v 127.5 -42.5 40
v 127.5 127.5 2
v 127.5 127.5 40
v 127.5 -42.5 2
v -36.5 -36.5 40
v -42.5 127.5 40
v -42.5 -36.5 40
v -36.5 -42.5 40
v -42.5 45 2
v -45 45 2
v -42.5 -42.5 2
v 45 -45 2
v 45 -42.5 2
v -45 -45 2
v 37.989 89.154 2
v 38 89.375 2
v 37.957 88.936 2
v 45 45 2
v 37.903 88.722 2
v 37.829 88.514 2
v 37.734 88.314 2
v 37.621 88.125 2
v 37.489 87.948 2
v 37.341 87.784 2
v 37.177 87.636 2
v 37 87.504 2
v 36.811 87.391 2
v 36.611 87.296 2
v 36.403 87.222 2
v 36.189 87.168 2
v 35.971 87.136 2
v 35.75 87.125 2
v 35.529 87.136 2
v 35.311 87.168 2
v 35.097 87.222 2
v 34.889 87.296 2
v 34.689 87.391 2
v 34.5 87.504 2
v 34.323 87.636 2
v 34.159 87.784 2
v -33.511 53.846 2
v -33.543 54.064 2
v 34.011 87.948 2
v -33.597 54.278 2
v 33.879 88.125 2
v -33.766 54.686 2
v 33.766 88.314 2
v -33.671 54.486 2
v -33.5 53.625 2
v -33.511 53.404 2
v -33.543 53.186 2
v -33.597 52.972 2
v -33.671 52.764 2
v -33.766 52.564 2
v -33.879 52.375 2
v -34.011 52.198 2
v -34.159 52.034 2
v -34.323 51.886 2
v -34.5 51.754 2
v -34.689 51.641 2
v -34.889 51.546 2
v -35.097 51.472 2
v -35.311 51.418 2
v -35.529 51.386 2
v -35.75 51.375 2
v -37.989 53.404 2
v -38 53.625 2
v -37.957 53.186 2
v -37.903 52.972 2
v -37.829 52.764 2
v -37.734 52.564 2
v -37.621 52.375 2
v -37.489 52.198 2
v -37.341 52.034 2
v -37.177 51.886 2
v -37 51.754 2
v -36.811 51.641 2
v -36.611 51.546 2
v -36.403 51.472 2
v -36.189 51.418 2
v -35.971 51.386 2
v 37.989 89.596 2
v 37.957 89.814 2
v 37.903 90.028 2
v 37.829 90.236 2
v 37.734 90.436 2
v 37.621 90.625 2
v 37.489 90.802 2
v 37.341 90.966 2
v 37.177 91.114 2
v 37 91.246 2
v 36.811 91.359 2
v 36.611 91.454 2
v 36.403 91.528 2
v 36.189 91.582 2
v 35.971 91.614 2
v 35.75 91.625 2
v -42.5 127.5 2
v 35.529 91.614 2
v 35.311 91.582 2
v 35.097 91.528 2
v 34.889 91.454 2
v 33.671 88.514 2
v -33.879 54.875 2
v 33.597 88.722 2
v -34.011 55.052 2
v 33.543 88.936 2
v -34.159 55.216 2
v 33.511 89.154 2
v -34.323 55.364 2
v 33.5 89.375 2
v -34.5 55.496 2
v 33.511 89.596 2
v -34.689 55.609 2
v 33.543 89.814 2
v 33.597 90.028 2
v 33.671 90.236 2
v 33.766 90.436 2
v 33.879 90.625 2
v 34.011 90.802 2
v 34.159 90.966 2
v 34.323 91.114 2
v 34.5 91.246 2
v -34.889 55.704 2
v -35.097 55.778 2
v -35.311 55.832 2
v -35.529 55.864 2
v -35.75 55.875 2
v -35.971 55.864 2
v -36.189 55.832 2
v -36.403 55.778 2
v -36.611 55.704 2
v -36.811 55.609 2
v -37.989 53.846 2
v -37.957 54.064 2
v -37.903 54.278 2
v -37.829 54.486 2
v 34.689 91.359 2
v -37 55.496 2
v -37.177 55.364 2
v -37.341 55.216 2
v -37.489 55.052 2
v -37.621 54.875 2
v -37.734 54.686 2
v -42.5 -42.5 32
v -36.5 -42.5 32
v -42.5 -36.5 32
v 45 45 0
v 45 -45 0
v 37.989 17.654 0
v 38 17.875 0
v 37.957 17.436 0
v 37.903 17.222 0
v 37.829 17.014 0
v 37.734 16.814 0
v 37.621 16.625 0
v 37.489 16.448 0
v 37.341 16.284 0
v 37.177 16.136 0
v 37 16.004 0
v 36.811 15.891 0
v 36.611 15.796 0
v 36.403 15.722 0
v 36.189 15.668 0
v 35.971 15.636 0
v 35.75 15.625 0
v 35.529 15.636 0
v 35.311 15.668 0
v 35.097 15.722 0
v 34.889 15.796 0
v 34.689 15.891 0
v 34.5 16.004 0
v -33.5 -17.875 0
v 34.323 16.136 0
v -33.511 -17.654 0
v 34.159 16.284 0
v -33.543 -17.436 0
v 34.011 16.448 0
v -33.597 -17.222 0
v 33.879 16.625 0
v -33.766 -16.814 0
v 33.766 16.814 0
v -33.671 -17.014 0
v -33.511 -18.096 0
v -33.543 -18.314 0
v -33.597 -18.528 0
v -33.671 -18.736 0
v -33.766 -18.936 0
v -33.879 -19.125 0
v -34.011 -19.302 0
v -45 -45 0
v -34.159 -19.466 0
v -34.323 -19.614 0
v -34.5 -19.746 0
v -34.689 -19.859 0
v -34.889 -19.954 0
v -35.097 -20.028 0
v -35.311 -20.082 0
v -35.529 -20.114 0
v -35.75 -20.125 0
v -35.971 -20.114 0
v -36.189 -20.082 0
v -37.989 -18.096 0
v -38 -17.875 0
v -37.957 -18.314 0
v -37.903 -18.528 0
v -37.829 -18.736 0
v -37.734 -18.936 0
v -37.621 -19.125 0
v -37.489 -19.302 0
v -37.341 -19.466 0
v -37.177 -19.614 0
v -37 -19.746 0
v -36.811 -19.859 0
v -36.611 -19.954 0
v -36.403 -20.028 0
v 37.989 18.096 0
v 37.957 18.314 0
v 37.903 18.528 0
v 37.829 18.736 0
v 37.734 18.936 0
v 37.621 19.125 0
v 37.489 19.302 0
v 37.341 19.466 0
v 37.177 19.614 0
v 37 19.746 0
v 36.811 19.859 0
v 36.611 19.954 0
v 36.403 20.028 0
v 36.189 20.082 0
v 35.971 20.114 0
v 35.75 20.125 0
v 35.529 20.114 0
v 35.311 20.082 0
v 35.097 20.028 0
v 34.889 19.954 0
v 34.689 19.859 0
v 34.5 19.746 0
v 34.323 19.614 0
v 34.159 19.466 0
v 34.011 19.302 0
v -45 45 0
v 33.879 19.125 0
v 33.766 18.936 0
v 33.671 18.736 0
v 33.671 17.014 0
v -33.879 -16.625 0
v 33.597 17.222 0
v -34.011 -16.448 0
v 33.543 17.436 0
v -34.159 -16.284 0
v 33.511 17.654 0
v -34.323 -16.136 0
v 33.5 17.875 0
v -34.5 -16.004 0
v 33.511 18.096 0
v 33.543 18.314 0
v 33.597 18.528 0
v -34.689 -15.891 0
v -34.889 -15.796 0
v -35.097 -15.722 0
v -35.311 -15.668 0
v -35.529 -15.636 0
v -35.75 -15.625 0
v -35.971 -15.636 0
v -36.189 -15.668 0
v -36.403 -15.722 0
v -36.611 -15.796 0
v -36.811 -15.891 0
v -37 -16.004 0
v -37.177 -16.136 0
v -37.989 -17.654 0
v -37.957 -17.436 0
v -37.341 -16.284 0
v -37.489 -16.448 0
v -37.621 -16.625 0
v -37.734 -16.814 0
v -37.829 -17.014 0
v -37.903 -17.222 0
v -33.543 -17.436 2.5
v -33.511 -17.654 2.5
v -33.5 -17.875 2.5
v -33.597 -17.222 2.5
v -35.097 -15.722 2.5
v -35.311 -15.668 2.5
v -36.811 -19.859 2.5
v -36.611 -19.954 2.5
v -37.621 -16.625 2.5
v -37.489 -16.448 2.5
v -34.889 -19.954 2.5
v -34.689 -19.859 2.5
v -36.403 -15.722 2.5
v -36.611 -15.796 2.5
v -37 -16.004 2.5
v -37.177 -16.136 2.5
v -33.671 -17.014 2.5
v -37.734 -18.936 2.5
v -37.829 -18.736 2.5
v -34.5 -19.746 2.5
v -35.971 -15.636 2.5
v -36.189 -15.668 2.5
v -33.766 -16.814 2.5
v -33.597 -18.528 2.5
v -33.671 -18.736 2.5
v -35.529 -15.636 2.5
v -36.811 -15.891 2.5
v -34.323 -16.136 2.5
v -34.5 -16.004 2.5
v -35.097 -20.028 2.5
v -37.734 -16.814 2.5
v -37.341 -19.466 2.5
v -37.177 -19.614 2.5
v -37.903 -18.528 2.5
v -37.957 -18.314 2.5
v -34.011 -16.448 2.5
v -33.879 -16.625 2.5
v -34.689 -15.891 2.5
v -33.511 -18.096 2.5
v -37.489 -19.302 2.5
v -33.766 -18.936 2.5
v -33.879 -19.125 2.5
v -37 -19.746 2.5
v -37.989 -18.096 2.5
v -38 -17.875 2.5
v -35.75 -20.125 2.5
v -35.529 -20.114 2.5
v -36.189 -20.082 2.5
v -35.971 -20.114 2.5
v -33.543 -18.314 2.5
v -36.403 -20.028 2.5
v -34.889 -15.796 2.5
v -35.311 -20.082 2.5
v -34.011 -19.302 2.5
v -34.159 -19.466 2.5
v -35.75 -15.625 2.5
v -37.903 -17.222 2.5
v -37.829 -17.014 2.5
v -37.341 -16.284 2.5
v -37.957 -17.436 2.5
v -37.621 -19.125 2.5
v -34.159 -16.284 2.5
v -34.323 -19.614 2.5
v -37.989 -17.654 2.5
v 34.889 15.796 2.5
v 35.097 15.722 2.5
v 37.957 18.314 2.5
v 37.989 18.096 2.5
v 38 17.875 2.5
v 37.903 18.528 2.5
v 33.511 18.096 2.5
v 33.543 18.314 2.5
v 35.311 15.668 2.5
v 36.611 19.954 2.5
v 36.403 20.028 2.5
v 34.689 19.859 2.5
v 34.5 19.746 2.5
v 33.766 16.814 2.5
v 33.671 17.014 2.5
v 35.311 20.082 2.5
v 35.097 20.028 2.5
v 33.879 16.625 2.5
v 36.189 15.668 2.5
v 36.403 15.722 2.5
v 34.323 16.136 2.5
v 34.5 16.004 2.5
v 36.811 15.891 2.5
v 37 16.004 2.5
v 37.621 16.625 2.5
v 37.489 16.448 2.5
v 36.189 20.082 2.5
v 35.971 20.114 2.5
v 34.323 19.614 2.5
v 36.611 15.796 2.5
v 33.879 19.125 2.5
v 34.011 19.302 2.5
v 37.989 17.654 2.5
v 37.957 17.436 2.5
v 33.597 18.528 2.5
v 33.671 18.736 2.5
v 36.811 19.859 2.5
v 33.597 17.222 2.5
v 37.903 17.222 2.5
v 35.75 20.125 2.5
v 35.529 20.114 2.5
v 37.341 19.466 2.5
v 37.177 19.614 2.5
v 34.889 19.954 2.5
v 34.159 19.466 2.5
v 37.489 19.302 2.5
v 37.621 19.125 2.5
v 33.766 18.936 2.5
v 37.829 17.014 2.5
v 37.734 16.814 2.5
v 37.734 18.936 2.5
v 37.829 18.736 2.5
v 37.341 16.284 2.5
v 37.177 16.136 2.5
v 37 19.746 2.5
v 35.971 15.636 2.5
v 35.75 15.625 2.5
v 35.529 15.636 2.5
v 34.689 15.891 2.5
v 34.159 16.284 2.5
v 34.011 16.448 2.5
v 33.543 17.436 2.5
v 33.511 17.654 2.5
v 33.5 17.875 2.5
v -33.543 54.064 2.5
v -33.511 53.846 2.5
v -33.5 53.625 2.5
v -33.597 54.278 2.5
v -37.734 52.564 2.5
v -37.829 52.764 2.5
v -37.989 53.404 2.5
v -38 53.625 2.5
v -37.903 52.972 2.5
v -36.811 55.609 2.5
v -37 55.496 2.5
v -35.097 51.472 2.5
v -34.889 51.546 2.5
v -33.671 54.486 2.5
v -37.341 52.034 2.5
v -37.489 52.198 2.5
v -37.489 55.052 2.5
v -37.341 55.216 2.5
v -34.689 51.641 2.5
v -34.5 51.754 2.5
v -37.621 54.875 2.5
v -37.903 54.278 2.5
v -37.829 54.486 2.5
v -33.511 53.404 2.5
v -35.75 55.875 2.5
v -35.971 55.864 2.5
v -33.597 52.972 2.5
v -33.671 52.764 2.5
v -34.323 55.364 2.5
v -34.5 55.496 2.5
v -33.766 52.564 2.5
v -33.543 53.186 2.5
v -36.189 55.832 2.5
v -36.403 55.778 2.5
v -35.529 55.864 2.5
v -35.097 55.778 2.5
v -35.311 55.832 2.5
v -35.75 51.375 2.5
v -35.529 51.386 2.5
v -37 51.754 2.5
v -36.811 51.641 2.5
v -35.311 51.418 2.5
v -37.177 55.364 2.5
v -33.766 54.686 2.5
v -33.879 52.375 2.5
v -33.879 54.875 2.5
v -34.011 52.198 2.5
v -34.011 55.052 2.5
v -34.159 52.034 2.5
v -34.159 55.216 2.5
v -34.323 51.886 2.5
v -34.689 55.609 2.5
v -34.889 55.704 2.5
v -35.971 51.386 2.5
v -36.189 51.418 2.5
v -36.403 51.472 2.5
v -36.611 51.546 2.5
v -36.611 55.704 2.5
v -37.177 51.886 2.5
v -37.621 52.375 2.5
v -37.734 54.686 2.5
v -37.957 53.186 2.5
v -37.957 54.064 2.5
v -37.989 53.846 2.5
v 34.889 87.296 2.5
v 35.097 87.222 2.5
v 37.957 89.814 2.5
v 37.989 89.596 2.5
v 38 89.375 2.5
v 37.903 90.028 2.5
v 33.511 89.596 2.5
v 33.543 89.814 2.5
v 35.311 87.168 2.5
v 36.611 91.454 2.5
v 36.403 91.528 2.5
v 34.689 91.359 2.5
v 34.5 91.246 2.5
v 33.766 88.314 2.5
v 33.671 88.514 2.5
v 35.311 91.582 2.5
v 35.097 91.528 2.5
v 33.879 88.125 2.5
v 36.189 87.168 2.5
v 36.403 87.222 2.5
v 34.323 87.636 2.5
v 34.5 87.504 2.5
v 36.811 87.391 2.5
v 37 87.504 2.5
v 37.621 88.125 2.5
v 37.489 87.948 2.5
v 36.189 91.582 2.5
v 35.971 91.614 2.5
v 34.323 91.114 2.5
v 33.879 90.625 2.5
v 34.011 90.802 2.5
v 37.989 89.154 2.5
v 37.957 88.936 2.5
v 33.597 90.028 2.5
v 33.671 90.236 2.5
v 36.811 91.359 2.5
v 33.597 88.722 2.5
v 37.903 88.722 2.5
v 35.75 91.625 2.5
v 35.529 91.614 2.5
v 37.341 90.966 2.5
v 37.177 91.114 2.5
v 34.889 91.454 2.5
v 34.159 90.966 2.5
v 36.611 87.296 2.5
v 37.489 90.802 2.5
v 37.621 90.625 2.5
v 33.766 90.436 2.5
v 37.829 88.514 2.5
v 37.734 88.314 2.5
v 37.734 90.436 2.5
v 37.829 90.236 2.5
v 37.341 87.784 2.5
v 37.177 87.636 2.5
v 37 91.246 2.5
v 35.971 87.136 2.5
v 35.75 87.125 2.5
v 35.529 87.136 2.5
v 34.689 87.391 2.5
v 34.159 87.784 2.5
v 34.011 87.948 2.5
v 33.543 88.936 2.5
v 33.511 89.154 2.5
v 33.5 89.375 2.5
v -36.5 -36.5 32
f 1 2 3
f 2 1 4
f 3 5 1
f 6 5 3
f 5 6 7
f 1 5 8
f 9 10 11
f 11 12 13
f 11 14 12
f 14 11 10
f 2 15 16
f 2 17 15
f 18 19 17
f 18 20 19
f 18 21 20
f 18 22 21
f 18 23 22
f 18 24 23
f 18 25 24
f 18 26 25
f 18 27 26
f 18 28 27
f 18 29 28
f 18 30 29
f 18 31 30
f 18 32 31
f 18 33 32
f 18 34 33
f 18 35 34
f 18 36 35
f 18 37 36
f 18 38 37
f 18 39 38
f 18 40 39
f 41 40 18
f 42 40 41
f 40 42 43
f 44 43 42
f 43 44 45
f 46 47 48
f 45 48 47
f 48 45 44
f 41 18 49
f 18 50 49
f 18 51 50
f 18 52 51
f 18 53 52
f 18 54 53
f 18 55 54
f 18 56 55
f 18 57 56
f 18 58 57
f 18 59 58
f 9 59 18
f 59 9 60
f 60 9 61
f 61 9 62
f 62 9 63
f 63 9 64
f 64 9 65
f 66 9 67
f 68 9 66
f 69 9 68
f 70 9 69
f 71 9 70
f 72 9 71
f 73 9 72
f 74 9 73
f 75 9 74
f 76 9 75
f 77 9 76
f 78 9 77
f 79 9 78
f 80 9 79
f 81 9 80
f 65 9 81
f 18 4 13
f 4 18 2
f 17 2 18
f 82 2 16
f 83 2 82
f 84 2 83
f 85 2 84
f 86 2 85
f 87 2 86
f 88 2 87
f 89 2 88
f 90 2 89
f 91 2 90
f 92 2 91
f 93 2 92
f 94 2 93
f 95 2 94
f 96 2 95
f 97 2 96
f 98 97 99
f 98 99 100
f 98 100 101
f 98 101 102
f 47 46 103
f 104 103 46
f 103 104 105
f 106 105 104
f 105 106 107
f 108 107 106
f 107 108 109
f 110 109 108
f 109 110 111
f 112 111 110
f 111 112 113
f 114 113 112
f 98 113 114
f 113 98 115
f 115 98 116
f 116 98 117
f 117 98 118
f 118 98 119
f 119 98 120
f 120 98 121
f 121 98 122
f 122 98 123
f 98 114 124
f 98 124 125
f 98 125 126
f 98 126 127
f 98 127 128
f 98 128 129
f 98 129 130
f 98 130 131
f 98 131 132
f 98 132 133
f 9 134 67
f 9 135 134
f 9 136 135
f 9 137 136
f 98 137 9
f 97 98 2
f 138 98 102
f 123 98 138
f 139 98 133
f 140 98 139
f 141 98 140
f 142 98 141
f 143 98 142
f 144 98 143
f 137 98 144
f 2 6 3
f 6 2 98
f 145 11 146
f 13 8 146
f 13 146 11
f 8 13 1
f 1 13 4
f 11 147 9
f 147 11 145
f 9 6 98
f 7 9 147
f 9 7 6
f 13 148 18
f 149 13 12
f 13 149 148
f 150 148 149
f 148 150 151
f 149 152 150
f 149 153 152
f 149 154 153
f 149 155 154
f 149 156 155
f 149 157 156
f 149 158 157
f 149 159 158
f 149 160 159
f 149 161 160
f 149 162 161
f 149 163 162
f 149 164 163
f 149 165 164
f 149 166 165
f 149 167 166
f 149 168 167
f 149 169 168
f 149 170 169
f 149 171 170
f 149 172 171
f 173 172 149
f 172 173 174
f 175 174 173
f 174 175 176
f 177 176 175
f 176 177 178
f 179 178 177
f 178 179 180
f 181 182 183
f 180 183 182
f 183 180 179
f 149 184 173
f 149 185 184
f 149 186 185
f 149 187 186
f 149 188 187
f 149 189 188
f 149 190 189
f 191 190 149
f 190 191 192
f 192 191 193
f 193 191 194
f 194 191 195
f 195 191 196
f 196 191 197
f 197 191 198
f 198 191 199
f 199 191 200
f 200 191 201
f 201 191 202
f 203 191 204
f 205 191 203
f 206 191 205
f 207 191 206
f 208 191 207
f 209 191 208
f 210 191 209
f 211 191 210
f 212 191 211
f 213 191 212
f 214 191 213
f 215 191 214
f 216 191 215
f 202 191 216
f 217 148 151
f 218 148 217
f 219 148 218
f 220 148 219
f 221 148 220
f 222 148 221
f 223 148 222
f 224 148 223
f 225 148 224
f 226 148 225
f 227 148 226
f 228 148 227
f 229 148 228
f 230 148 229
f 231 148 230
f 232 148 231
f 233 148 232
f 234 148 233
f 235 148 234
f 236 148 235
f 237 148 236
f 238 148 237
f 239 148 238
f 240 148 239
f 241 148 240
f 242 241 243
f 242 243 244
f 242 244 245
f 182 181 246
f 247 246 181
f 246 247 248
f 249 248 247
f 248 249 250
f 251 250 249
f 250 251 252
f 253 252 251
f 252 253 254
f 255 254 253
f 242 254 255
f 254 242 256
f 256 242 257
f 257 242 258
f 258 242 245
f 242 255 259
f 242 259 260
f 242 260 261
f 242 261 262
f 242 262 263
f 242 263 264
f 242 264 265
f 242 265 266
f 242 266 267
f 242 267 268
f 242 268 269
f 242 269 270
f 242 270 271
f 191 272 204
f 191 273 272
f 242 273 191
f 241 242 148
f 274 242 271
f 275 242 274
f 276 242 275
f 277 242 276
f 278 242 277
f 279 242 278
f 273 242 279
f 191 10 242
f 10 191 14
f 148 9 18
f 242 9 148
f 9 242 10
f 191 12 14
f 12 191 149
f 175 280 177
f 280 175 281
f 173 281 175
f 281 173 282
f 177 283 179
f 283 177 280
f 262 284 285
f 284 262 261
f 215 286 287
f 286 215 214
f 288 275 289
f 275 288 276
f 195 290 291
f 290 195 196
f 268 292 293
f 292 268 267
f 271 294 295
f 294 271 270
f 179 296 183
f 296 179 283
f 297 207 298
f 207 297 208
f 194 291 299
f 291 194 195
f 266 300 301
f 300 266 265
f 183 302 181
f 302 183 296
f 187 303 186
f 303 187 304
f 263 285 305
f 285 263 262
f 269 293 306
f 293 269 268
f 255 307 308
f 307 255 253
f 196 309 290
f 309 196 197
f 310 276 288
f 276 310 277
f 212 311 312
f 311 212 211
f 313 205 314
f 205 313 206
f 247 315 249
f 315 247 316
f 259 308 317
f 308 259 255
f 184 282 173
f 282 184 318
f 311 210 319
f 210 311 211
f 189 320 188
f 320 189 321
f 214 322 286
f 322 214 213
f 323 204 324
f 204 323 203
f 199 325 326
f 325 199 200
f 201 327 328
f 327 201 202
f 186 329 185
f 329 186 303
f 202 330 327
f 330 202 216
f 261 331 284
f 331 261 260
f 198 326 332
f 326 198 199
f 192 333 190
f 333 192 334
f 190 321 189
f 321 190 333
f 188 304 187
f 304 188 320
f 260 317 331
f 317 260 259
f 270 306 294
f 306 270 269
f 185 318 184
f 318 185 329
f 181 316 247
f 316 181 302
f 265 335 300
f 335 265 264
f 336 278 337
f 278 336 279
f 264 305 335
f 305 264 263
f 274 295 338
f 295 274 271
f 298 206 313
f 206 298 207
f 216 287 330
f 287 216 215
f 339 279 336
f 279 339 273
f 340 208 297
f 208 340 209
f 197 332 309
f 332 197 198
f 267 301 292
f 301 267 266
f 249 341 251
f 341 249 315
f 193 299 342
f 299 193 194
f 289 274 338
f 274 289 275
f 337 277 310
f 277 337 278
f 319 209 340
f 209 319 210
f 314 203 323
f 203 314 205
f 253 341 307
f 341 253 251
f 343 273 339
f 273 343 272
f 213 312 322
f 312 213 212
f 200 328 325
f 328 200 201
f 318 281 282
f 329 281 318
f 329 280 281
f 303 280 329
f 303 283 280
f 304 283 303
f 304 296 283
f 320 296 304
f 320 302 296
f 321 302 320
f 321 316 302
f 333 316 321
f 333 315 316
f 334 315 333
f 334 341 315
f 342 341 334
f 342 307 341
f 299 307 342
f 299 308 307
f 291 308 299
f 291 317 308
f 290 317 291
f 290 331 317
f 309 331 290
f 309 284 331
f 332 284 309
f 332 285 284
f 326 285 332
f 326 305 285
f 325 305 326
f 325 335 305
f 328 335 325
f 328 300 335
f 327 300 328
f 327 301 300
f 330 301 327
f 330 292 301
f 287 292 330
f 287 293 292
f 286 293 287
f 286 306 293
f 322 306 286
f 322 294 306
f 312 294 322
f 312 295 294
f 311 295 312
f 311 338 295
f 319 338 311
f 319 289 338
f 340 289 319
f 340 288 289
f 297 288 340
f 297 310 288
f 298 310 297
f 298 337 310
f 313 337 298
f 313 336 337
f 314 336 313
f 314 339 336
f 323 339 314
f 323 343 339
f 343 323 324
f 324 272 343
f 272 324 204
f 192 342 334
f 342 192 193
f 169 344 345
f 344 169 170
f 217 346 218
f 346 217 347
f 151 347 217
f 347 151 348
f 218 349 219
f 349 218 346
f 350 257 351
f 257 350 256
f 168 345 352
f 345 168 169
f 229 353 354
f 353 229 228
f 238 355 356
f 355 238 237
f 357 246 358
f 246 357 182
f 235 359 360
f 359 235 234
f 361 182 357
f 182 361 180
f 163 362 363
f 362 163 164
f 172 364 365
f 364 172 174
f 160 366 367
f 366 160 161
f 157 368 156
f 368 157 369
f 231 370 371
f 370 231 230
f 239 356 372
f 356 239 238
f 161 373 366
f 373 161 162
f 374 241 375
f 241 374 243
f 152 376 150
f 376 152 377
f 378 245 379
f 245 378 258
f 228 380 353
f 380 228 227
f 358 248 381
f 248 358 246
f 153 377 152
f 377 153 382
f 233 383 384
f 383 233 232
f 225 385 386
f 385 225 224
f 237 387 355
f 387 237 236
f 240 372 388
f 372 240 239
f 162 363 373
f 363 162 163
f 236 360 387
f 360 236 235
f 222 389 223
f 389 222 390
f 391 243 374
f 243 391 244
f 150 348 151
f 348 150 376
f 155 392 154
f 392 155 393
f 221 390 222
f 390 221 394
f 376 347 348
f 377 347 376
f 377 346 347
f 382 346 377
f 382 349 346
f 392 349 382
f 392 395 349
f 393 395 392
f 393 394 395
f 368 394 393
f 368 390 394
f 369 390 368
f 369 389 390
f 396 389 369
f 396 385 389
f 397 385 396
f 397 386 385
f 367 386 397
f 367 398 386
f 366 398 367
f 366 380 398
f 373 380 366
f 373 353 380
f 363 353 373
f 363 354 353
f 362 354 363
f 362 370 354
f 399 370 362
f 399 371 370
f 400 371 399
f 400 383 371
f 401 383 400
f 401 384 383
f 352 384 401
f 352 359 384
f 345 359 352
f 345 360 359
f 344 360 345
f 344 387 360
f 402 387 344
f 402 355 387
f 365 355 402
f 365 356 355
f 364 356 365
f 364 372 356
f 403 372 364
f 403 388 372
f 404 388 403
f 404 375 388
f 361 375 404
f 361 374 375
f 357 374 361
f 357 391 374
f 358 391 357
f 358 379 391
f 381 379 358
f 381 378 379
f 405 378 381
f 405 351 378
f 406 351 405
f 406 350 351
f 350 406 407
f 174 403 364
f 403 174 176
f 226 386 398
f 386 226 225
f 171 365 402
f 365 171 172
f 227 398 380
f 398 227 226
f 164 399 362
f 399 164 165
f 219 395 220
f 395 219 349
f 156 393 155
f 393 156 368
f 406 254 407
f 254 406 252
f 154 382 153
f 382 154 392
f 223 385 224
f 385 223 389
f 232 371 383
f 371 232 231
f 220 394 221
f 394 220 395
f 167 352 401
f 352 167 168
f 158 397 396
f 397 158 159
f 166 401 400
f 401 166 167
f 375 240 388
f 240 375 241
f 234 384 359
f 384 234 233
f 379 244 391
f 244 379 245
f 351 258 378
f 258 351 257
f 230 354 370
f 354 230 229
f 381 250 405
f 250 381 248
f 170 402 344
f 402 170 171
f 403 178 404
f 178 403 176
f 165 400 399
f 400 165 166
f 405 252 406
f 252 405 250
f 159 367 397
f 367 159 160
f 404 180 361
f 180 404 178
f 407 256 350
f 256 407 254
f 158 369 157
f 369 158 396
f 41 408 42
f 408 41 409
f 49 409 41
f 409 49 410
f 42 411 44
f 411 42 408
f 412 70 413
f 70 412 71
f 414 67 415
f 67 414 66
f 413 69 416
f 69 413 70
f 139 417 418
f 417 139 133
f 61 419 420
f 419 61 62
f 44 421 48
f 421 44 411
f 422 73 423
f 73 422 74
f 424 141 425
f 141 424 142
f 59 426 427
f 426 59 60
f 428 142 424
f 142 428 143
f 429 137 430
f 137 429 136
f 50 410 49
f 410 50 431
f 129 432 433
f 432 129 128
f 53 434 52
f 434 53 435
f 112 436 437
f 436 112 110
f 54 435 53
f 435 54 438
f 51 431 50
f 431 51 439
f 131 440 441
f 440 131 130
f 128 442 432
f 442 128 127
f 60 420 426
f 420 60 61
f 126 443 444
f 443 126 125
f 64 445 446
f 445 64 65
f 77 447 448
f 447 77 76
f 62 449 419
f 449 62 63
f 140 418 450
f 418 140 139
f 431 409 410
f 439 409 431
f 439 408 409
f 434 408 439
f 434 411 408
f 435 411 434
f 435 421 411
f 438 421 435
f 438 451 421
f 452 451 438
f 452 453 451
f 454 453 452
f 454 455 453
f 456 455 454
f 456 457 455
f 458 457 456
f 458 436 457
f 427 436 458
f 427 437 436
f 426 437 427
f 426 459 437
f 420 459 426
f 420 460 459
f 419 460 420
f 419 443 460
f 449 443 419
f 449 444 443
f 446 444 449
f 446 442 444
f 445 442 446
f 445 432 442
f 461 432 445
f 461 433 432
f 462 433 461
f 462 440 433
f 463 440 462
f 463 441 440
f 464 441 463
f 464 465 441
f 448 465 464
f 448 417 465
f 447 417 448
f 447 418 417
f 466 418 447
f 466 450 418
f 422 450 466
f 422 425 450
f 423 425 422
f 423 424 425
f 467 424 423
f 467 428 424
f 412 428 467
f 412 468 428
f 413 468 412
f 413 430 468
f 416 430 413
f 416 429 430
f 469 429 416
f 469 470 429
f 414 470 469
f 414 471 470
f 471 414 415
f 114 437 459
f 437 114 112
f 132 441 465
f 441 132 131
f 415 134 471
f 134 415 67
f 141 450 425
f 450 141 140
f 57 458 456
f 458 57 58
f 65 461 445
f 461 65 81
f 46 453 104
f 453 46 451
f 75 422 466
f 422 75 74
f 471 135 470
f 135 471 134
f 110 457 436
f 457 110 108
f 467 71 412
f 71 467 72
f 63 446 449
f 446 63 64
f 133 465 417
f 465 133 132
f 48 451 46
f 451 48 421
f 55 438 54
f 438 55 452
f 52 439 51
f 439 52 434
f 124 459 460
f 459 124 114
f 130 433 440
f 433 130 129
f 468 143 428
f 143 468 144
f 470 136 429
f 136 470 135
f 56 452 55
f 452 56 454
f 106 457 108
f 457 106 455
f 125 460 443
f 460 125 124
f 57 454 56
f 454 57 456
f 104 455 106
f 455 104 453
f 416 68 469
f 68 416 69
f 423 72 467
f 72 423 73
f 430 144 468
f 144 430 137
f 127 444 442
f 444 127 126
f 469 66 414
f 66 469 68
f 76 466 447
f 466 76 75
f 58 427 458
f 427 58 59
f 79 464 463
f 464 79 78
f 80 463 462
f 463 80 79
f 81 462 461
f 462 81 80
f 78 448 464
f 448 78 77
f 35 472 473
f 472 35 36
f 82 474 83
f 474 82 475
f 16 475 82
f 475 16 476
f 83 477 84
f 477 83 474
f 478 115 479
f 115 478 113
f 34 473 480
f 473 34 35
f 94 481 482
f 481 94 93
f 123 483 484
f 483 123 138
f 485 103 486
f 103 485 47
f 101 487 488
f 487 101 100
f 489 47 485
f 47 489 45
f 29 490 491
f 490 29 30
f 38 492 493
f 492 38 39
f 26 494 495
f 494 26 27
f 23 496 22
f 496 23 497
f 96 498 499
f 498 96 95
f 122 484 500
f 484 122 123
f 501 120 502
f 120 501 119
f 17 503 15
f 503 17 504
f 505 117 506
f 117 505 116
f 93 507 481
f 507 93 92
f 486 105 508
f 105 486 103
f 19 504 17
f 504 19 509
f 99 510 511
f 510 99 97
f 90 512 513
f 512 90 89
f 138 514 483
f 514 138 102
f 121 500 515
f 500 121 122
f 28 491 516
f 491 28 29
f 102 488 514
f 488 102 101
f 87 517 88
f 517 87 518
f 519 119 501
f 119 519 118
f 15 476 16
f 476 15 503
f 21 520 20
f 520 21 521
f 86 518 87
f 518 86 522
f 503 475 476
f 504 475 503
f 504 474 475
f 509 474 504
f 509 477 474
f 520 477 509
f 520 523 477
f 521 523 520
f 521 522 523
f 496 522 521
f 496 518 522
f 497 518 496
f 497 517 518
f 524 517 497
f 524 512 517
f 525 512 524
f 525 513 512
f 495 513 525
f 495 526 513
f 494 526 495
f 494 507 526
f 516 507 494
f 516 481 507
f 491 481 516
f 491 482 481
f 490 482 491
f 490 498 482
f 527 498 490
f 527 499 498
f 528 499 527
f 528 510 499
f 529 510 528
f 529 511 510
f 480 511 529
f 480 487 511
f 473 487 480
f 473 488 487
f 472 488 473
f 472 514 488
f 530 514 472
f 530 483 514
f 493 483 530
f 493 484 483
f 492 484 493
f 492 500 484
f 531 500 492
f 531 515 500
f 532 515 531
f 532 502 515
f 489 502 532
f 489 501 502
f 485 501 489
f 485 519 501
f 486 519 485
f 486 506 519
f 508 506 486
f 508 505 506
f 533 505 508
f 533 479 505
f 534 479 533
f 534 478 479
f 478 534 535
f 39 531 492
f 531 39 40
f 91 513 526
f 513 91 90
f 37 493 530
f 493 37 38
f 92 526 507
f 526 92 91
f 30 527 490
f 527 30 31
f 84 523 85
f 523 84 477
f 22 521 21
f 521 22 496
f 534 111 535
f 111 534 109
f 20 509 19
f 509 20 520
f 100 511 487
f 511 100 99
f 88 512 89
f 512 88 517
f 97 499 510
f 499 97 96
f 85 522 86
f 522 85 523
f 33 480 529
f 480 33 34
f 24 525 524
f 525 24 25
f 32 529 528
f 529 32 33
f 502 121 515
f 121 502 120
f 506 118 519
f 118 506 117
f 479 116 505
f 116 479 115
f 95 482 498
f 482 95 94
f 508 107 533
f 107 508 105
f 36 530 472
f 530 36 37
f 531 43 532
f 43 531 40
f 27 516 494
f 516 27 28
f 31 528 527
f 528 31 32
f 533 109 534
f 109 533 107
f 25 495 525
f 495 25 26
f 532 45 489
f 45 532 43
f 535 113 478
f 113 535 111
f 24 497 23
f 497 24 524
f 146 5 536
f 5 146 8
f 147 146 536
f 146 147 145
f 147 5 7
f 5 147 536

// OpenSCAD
// DIY magnetic stirrer housing (print orientation: top plate down, box open upward)
// Units: mm

$fn = 64;

// ---- Dimensions ----
plate_t      = 2;     // top plate thickness (z = 0 to 2)
wall_t       = 2.5;   // wall thickness (z = 2 to 40)
box_h        = 40;    // outer height of box top (z = wall top)
outer_x      = 90;    // outer size in X
outer_y      = 90;    // outer size in Y
hole_d       = 4.5;   // M4 screw hole diameter
hole_count   = 4;     // number of screw holes
hole_pitch   = 71.5;  // square pattern side for holes
notch_w      = 12;    // cable notch width
notch_depth  = 8;     // cable notch depth from open edge (z = 32 to 40)
eps          = 0.5;   // cutter overshoot past faces

// ---- Model ----
difference() {
    union() {
        // Top plate (lies on bed)
        translate([-outer_x/2, -outer_y/2, 0])
            cube([outer_x, outer_y, plate_t]);

        // Four walls rising from plate to z = box_h
        for (sx = [-1, 1], sy = [-1, 1]) {
            translate([sx > 0 ? -outer_x/2 + wall_t : outer_x/2 - wall_t,
                       sy > 0 ? -outer_y/2 + wall_t : outer_y/2 - wall_t,
                       plate_t])
                cube([outer_x - 2*wall_t, outer_y - 2*wall_t, box_h - plate_t]);
        }
    }

    // Screw holes through top plate on 71.5 mm square pattern
    for (i = [0 : hole_count - 1]) {
        a = (i % 2 - 0.5) * hole_pitch;
        b = (i / 2 - 0.25) * hole_pitch;
        translate([a, b, -eps])
            cylinder(d = hole_d, h = plate_t + 2*eps);
    }

    // Cable notch in one wall: 12 mm wide, centred along the wall,
    // reaching 8 mm down from the open edge (z = 32 to z = 40)
    translate([-outer_x/2 + wall_t - notch_w/2, -outer_y/2 + wall_t - notch_w/2,
               box_h - notch_depth])
        cube([notch_w, notch_w, notch_depth + eps]);
}
